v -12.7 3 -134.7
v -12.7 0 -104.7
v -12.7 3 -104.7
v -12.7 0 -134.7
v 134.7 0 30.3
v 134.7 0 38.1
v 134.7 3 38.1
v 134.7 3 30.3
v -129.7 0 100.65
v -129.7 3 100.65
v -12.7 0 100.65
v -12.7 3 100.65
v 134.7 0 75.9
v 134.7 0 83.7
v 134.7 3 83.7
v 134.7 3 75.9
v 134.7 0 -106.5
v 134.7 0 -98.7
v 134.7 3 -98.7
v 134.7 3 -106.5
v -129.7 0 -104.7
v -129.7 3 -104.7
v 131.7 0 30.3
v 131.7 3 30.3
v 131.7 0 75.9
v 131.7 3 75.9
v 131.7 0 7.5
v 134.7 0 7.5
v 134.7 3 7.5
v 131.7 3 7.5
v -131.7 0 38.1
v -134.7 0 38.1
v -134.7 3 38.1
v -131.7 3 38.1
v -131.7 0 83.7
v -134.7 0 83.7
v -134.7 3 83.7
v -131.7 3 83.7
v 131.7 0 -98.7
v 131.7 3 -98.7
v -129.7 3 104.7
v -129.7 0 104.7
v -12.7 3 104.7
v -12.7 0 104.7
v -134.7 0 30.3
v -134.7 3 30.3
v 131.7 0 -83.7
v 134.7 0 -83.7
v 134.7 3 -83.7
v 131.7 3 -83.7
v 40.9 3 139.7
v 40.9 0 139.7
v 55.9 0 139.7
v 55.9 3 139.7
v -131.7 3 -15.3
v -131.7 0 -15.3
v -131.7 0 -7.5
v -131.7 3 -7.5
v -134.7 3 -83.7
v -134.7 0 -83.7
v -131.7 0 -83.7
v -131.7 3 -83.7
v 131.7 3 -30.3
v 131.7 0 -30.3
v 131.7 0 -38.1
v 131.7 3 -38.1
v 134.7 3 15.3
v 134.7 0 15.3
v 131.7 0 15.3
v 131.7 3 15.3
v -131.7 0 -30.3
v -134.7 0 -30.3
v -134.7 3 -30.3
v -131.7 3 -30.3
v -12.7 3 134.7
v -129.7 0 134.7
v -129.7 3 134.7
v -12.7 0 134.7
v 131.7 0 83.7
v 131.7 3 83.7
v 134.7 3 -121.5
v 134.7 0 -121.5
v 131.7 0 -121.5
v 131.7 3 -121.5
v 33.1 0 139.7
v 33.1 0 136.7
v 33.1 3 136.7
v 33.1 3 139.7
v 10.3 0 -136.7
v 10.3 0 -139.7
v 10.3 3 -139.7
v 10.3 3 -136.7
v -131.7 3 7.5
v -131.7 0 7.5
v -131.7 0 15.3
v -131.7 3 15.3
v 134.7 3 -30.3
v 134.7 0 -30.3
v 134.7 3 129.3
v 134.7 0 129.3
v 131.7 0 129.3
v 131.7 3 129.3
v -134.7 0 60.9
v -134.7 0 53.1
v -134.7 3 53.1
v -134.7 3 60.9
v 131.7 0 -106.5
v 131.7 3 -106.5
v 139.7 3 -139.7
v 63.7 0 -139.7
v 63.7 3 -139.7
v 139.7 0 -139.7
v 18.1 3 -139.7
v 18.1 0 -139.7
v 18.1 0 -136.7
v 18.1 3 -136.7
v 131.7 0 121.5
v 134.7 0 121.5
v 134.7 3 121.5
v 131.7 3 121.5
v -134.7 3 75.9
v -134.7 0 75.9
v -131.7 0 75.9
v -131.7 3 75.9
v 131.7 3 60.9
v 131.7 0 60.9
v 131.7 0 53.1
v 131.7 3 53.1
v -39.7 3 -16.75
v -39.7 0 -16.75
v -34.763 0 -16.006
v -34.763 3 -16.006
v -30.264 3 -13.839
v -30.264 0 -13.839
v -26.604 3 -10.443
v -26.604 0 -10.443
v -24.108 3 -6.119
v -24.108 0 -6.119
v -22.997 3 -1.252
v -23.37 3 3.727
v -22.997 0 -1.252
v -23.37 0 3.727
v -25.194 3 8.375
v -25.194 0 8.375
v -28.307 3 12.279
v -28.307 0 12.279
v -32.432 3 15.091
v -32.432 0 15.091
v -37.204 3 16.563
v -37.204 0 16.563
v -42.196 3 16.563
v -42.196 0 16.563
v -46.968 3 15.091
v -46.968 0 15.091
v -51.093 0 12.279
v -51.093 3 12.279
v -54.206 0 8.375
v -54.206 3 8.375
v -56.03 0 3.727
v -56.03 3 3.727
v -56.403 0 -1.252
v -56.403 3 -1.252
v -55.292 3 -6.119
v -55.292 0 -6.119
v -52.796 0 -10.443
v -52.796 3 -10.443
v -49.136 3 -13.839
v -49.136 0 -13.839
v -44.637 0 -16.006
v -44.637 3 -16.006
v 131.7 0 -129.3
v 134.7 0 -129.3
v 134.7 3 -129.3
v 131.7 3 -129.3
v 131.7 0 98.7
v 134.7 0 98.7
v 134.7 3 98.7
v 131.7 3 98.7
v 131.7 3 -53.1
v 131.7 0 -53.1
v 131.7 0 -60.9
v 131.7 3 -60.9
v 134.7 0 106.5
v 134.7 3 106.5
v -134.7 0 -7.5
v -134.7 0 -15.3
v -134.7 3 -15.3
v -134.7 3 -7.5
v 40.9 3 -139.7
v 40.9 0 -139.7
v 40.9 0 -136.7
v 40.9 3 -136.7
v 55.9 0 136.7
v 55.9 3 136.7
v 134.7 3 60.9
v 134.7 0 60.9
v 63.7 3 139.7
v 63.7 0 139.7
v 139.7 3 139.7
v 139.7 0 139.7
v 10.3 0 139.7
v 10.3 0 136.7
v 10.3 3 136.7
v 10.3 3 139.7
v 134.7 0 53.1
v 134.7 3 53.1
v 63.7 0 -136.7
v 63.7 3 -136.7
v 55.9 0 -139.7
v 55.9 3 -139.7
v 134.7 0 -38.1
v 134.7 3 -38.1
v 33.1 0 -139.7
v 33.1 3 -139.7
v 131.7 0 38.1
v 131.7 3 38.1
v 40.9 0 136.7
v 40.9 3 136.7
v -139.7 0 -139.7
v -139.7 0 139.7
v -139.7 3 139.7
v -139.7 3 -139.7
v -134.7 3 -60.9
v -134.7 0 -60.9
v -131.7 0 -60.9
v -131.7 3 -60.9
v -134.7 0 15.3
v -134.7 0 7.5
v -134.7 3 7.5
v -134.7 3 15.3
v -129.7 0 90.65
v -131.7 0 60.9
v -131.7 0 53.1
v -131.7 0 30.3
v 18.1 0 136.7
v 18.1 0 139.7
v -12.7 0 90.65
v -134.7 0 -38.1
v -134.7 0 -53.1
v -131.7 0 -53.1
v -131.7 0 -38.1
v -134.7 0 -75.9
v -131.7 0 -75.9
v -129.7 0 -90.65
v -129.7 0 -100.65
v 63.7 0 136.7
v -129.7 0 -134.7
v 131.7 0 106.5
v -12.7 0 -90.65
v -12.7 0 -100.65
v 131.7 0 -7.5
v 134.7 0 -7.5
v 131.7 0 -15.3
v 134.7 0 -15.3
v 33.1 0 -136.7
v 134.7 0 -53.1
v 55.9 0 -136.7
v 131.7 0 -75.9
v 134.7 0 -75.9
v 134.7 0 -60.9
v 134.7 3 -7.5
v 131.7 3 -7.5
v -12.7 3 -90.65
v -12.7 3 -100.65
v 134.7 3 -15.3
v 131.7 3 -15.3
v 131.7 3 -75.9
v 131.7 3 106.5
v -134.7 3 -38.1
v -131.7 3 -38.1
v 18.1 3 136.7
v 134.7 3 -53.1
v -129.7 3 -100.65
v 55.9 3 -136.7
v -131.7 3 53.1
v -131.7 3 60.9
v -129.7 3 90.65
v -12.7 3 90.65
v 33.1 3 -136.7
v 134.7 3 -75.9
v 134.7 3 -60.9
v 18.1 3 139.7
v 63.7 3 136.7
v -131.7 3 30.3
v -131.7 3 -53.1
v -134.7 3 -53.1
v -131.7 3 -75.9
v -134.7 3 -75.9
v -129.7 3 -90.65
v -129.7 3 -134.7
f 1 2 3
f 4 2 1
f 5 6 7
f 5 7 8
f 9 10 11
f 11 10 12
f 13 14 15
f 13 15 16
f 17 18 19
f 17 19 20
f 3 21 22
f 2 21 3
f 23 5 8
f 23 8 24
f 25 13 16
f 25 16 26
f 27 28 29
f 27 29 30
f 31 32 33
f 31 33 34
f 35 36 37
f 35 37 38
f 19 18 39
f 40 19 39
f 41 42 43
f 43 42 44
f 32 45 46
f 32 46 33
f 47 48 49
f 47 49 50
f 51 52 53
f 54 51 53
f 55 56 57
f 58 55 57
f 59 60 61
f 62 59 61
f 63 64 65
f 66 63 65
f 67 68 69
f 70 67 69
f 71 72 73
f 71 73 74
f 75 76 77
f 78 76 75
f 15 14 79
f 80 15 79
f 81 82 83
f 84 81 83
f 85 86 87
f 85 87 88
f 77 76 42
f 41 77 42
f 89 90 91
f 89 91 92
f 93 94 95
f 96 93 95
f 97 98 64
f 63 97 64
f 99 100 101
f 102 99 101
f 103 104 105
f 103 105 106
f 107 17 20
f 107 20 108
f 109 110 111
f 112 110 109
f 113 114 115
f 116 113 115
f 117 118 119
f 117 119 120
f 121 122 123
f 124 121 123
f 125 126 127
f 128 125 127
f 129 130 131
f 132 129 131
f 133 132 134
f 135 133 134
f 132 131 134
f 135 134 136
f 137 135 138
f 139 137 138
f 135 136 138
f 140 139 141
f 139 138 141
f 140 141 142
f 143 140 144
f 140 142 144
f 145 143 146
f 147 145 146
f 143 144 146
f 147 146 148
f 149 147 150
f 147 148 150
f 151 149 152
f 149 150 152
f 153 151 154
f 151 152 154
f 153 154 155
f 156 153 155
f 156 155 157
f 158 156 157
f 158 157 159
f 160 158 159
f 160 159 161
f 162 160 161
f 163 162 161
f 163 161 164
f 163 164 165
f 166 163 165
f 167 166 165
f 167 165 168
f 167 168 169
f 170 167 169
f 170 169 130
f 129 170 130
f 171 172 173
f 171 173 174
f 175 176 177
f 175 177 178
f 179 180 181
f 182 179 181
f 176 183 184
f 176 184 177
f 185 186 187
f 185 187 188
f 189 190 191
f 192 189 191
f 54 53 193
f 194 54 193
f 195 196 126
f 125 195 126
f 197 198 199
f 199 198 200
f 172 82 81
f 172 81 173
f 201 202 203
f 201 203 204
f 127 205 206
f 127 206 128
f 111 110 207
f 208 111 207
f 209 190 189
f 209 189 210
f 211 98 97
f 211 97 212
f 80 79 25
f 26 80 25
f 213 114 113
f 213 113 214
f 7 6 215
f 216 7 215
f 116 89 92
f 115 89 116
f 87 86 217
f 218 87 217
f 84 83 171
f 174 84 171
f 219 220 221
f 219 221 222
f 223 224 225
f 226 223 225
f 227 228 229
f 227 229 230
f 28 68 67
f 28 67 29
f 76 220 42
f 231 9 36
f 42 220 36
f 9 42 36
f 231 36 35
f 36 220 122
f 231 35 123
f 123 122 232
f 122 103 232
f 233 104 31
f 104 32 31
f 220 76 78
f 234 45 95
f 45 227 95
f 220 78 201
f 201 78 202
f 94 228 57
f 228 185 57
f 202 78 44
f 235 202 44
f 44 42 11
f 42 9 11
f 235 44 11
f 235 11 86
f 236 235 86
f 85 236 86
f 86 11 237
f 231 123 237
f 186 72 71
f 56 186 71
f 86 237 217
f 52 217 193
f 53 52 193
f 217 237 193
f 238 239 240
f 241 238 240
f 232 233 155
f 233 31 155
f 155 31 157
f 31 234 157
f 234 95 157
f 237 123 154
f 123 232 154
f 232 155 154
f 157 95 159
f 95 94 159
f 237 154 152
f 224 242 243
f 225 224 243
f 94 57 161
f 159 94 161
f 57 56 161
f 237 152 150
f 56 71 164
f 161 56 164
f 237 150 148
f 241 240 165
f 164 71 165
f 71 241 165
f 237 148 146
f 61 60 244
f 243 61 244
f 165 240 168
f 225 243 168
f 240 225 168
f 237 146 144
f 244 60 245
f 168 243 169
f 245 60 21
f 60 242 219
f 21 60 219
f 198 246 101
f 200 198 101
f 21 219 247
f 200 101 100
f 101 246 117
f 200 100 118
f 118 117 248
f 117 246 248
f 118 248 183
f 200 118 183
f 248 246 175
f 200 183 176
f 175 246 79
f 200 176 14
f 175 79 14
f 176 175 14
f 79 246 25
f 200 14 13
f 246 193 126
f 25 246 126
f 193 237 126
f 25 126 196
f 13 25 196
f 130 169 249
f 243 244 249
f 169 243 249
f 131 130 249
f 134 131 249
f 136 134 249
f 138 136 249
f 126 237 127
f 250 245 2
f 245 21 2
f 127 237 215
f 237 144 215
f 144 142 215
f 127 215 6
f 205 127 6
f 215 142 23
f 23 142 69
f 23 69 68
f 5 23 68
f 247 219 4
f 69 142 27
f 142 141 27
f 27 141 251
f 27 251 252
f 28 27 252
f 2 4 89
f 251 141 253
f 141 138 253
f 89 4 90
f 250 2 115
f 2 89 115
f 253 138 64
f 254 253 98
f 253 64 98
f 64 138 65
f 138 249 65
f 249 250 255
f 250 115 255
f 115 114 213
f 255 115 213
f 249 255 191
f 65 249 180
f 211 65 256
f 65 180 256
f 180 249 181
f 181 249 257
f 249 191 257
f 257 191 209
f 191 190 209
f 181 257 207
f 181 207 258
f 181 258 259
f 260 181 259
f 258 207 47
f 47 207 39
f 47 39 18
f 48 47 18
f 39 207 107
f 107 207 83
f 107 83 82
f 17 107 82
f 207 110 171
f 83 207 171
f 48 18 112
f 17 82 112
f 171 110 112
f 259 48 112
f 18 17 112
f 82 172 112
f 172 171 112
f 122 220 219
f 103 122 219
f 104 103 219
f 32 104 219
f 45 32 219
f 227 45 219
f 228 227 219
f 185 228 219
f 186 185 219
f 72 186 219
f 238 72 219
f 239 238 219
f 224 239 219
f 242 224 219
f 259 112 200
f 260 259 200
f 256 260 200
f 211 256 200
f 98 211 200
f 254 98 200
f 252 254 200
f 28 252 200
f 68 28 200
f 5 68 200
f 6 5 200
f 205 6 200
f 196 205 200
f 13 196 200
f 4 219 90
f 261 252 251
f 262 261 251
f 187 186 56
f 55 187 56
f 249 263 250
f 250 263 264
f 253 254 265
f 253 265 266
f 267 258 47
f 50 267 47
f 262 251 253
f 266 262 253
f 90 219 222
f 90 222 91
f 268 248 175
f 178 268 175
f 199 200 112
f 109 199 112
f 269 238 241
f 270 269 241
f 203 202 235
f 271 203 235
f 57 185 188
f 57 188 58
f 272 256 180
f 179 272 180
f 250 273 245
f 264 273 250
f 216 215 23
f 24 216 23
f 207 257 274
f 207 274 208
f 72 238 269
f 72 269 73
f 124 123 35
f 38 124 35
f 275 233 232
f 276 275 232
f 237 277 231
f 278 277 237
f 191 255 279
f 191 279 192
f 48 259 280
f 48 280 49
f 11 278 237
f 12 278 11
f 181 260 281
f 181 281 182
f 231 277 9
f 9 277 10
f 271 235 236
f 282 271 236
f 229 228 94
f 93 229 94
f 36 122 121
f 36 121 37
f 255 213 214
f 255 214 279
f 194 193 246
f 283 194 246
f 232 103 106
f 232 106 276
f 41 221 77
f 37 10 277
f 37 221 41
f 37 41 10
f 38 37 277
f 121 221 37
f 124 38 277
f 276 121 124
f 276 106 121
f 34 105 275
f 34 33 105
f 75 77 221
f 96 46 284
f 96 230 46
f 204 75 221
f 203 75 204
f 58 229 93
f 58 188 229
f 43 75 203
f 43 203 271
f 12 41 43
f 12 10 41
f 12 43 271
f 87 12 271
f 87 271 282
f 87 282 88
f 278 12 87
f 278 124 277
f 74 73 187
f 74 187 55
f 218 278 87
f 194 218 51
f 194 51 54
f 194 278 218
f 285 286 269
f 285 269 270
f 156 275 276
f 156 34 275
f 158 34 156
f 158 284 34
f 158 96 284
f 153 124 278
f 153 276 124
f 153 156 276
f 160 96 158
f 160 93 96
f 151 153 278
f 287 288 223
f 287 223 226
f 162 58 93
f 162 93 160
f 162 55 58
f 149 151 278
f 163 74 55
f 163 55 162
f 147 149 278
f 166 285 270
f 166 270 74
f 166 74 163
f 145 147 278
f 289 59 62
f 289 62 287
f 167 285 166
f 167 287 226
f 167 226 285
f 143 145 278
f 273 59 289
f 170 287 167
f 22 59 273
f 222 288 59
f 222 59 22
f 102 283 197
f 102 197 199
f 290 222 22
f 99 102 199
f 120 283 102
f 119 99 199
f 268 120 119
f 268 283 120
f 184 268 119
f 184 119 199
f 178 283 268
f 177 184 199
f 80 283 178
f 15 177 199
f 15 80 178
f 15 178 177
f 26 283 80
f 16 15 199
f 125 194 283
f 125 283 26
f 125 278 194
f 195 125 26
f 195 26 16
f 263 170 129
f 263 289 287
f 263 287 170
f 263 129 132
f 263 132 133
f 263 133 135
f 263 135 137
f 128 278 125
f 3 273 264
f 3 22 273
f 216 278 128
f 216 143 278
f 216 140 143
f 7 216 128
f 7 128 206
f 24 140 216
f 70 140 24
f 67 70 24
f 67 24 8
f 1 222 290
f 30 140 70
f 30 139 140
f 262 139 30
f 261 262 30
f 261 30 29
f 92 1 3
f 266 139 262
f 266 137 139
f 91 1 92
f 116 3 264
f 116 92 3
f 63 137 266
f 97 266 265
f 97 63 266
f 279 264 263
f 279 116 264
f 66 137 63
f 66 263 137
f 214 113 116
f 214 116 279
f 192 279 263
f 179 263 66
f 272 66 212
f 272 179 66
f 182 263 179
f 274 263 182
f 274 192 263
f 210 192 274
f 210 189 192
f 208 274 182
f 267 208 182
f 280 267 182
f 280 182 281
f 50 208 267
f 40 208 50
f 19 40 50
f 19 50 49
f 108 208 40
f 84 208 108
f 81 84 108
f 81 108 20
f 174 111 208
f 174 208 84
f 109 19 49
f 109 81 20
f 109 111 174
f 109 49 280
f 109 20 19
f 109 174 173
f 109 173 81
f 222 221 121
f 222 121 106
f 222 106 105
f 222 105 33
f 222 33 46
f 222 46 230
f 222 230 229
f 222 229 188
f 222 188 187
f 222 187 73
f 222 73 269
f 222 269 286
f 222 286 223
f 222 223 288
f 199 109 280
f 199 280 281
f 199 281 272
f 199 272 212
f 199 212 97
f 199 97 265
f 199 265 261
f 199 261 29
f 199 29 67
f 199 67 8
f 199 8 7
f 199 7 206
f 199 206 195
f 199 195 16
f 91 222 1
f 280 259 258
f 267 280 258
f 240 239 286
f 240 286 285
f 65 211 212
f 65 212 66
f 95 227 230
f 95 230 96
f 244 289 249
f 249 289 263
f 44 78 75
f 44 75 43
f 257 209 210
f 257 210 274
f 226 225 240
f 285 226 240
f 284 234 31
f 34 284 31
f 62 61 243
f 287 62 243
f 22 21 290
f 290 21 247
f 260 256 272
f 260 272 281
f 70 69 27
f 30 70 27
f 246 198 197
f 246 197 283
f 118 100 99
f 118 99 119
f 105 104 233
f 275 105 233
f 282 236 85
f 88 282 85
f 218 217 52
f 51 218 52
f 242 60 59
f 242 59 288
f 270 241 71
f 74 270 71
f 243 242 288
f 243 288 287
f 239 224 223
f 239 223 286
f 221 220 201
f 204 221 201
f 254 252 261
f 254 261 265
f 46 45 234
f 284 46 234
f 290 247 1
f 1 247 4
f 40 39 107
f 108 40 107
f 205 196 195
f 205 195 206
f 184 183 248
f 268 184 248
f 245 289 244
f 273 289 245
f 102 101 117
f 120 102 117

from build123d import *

# Parameters (mm, degrees)
SKETCH1_W               = 279.4
SKETCH1_H               = 279.4
SKETCH1_W_2             = 117
SKETCH1_H_2             = 30
BOSS_EXTRUDE1_DEPTH     = 3
SKETCH2_W               = 117
SKETCH2_H               = 10
CUT_EXTRUDE1_DEPTH      = 10
SKETCH3_W               = 3
SKETCH3_H               = 7.8
CUT_EXTRUDE2_DEPTH      = 198.588410591
LPATTERN1_COUNT         = 12
LPATTERN1_PITCH         = 22.8
SKETCH5_W               = 7.8
SKETCH5_H               = 3
CUT_EXTRUDE3_DEPTH      = 198.588410591
LPATTERN2_COUNT         = 3
LPATTERN2_PITCH         = 22.8
MIRROR2_COPY_1_SKETCH_W = 7.8
MIRROR2_COPY_1_SKETCH_H = 3
MIRROR2_COPY_1_DEPTH    = 198.588410591
MIRROR2_COPY_2_SKETCH_W = 7.8
MIRROR2_COPY_2_SKETCH_H = 3
MIRROR2_COPY_2_DEPTH    = 198.588410591
SKETCH6_W               = 3
SKETCH6_H               = 7.8
CUT_EXTRUDE4_DEPTH      = 198.588410591
LPATTERN3_COUNT         = 8
LPATTERN3_PITCH         = 22.8
SKETCH7_R               = 16.75
CUT_EXTRUDE5_DEPTH      = 198.588410591


with BuildPart() as part:
    # Sketch1 → Boss-Extrude1 (new body)
    with BuildSketch(Plane(origin=(0, 0, 0), x_dir=(1, 0, 0), z_dir=(0, 1, 0))):
        Rectangle(SKETCH1_W, SKETCH1_H)
        with Locations((-71.2, 119.7)):
            Rectangle(SKETCH1_W_2, SKETCH1_H_2, mode=Mode.SUBTRACT)
        with Locations((-71.2, -119.7)):
            Rectangle(SKETCH1_W_2, SKETCH1_H_2, mode=Mode.SUBTRACT)
    extrude(amount=BOSS_EXTRUDE1_DEPTH)

    # Sketch2 → Cut-Extrude1 (cut)
    with BuildSketch(Plane(origin=(0, 3, 0), x_dir=(1, 0, 0), z_dir=(0, 1, 0))):
        with Locations((-71.2, 95.65)):
            Rectangle(SKETCH2_W, SKETCH2_H)
    cut_extrude1 = extrude(amount=-CUT_EXTRUDE1_DEPTH, mode=Mode.SUBTRACT)

    # Mirror1: Cut-Extrude1 across plane
    add(cut_extrude1.mirror(Plane.XY), mode=Mode.SUBTRACT)

    # Sketch3 → Cut-Extrude2 (cut, through all)
    with BuildSketch(Plane(origin=(0, 0, 0), x_dir=(-1, 0, 0), z_dir=(0, -1, 0))):
        with Locations((-133.2, 125.4)):
            Rectangle(SKETCH3_W, SKETCH3_H)
    cut_extrude2 = extrude(amount=-CUT_EXTRUDE2_DEPTH, mode=Mode.SUBTRACT)

    # LPattern1: Cut-Extrude2 ×12
    with Locations(*[(0, 0, i * LPATTERN1_PITCH) for i in range(1, LPATTERN1_COUNT)]):
        add(cut_extrude2, mode=Mode.SUBTRACT)

    # Sketch5 → Cut-Extrude3 (cut, through all)
    with BuildSketch(Plane.XZ):
        with Locations((59.8, -138.2)):
            Rectangle(SKETCH5_W, SKETCH5_H)
    cut_extrude3 = extrude(amount=-CUT_EXTRUDE3_DEPTH, mode=Mode.SUBTRACT)

    # LPattern2: Cut-Extrude3 ×3
    with Locations(*[(-i * LPATTERN2_PITCH, 0, 0) for i in range(1, LPATTERN2_COUNT)]):
        add(cut_extrude3, mode=Mode.SUBTRACT)

    # Mirror2: Cut-Extrude3 across plane
    add(cut_extrude3.mirror(Plane.XY), mode=Mode.SUBTRACT)

    # Mirror2 copy 1 sketch → Mirror2 copy 1 (cut, through all)
    with BuildSketch(Plane(origin=(-22.8, 0, 0), x_dir=(1, 0, 0), z_dir=(0, -1, 0))):
        with Locations((59.8, 138.2)):
            Rectangle(MIRROR2_COPY_1_SKETCH_W, MIRROR2_COPY_1_SKETCH_H)
    extrude(amount=-MIRROR2_COPY_1_DEPTH, mode=Mode.SUBTRACT)

    # Mirror2 copy 2 sketch → Mirror2 copy 2 (cut, through all)
    with BuildSketch(Plane(origin=(-45.6, 0, 0), x_dir=(1, 0, 0), z_dir=(0, -1, 0))):
        with Locations((59.8, 138.2)):
            Rectangle(MIRROR2_COPY_2_SKETCH_W, MIRROR2_COPY_2_SKETCH_H)
    extrude(amount=-MIRROR2_COPY_2_DEPTH, mode=Mode.SUBTRACT)

    # Sketch6 → Cut-Extrude4 (cut, through all)
    with BuildSketch(Plane.XZ):
        with Locations((-133.2, -79.8)):
            Rectangle(SKETCH6_W, SKETCH6_H)
    cut_extrude4 = extrude(amount=-CUT_EXTRUDE4_DEPTH, mode=Mode.SUBTRACT)

    # LPattern3: Cut-Extrude4 ×8
    with Locations(*[(0, 0, i * LPATTERN3_PITCH) for i in range(1, LPATTERN3_COUNT)]):
        add(cut_extrude4, mode=Mode.SUBTRACT)

    # Sketch7 → Cut-Extrude5 (cut, through all)
    with BuildSketch(Plane(origin=(0, 0, 0), x_dir=(-1, 0, 0), z_dir=(0, -1, 0))):
        with Locations(Location((39.7, 0, 0), (0, 0, 90))):
            Circle(SKETCH7_R)
    extrude(amount=-CUT_EXTRUDE5_DEPTH, mode=Mode.SUBTRACT)


solid = part.part
